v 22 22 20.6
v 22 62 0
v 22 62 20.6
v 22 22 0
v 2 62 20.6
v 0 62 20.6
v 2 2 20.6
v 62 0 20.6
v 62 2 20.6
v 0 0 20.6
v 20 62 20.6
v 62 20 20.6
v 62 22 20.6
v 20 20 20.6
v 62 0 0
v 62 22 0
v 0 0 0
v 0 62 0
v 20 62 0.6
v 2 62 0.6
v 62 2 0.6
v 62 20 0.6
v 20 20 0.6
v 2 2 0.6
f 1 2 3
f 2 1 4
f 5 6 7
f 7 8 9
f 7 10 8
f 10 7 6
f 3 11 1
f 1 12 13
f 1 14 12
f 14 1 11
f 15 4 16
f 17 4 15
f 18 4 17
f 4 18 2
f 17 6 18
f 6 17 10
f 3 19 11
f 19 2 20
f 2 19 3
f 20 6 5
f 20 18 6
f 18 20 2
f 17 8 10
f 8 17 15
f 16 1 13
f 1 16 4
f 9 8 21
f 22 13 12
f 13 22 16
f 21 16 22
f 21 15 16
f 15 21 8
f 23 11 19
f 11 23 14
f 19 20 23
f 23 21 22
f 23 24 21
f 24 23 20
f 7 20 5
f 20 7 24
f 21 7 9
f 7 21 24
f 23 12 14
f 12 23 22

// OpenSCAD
base = 0.6;
wall = 2;
inner = [18, 60, 20];
outer = inner + [wall * 2, wall, base];

module shape(size)
{
	union()
	{
		cube(size);
		
		rotate([0, 0, -90])
		translate([-size.x, 0, 0])
		cube(size);
	}
}

difference()
{
	shape(outer);

	translate([wall, wall, base])
	shape(inner + [0, 1, 1]);
}
